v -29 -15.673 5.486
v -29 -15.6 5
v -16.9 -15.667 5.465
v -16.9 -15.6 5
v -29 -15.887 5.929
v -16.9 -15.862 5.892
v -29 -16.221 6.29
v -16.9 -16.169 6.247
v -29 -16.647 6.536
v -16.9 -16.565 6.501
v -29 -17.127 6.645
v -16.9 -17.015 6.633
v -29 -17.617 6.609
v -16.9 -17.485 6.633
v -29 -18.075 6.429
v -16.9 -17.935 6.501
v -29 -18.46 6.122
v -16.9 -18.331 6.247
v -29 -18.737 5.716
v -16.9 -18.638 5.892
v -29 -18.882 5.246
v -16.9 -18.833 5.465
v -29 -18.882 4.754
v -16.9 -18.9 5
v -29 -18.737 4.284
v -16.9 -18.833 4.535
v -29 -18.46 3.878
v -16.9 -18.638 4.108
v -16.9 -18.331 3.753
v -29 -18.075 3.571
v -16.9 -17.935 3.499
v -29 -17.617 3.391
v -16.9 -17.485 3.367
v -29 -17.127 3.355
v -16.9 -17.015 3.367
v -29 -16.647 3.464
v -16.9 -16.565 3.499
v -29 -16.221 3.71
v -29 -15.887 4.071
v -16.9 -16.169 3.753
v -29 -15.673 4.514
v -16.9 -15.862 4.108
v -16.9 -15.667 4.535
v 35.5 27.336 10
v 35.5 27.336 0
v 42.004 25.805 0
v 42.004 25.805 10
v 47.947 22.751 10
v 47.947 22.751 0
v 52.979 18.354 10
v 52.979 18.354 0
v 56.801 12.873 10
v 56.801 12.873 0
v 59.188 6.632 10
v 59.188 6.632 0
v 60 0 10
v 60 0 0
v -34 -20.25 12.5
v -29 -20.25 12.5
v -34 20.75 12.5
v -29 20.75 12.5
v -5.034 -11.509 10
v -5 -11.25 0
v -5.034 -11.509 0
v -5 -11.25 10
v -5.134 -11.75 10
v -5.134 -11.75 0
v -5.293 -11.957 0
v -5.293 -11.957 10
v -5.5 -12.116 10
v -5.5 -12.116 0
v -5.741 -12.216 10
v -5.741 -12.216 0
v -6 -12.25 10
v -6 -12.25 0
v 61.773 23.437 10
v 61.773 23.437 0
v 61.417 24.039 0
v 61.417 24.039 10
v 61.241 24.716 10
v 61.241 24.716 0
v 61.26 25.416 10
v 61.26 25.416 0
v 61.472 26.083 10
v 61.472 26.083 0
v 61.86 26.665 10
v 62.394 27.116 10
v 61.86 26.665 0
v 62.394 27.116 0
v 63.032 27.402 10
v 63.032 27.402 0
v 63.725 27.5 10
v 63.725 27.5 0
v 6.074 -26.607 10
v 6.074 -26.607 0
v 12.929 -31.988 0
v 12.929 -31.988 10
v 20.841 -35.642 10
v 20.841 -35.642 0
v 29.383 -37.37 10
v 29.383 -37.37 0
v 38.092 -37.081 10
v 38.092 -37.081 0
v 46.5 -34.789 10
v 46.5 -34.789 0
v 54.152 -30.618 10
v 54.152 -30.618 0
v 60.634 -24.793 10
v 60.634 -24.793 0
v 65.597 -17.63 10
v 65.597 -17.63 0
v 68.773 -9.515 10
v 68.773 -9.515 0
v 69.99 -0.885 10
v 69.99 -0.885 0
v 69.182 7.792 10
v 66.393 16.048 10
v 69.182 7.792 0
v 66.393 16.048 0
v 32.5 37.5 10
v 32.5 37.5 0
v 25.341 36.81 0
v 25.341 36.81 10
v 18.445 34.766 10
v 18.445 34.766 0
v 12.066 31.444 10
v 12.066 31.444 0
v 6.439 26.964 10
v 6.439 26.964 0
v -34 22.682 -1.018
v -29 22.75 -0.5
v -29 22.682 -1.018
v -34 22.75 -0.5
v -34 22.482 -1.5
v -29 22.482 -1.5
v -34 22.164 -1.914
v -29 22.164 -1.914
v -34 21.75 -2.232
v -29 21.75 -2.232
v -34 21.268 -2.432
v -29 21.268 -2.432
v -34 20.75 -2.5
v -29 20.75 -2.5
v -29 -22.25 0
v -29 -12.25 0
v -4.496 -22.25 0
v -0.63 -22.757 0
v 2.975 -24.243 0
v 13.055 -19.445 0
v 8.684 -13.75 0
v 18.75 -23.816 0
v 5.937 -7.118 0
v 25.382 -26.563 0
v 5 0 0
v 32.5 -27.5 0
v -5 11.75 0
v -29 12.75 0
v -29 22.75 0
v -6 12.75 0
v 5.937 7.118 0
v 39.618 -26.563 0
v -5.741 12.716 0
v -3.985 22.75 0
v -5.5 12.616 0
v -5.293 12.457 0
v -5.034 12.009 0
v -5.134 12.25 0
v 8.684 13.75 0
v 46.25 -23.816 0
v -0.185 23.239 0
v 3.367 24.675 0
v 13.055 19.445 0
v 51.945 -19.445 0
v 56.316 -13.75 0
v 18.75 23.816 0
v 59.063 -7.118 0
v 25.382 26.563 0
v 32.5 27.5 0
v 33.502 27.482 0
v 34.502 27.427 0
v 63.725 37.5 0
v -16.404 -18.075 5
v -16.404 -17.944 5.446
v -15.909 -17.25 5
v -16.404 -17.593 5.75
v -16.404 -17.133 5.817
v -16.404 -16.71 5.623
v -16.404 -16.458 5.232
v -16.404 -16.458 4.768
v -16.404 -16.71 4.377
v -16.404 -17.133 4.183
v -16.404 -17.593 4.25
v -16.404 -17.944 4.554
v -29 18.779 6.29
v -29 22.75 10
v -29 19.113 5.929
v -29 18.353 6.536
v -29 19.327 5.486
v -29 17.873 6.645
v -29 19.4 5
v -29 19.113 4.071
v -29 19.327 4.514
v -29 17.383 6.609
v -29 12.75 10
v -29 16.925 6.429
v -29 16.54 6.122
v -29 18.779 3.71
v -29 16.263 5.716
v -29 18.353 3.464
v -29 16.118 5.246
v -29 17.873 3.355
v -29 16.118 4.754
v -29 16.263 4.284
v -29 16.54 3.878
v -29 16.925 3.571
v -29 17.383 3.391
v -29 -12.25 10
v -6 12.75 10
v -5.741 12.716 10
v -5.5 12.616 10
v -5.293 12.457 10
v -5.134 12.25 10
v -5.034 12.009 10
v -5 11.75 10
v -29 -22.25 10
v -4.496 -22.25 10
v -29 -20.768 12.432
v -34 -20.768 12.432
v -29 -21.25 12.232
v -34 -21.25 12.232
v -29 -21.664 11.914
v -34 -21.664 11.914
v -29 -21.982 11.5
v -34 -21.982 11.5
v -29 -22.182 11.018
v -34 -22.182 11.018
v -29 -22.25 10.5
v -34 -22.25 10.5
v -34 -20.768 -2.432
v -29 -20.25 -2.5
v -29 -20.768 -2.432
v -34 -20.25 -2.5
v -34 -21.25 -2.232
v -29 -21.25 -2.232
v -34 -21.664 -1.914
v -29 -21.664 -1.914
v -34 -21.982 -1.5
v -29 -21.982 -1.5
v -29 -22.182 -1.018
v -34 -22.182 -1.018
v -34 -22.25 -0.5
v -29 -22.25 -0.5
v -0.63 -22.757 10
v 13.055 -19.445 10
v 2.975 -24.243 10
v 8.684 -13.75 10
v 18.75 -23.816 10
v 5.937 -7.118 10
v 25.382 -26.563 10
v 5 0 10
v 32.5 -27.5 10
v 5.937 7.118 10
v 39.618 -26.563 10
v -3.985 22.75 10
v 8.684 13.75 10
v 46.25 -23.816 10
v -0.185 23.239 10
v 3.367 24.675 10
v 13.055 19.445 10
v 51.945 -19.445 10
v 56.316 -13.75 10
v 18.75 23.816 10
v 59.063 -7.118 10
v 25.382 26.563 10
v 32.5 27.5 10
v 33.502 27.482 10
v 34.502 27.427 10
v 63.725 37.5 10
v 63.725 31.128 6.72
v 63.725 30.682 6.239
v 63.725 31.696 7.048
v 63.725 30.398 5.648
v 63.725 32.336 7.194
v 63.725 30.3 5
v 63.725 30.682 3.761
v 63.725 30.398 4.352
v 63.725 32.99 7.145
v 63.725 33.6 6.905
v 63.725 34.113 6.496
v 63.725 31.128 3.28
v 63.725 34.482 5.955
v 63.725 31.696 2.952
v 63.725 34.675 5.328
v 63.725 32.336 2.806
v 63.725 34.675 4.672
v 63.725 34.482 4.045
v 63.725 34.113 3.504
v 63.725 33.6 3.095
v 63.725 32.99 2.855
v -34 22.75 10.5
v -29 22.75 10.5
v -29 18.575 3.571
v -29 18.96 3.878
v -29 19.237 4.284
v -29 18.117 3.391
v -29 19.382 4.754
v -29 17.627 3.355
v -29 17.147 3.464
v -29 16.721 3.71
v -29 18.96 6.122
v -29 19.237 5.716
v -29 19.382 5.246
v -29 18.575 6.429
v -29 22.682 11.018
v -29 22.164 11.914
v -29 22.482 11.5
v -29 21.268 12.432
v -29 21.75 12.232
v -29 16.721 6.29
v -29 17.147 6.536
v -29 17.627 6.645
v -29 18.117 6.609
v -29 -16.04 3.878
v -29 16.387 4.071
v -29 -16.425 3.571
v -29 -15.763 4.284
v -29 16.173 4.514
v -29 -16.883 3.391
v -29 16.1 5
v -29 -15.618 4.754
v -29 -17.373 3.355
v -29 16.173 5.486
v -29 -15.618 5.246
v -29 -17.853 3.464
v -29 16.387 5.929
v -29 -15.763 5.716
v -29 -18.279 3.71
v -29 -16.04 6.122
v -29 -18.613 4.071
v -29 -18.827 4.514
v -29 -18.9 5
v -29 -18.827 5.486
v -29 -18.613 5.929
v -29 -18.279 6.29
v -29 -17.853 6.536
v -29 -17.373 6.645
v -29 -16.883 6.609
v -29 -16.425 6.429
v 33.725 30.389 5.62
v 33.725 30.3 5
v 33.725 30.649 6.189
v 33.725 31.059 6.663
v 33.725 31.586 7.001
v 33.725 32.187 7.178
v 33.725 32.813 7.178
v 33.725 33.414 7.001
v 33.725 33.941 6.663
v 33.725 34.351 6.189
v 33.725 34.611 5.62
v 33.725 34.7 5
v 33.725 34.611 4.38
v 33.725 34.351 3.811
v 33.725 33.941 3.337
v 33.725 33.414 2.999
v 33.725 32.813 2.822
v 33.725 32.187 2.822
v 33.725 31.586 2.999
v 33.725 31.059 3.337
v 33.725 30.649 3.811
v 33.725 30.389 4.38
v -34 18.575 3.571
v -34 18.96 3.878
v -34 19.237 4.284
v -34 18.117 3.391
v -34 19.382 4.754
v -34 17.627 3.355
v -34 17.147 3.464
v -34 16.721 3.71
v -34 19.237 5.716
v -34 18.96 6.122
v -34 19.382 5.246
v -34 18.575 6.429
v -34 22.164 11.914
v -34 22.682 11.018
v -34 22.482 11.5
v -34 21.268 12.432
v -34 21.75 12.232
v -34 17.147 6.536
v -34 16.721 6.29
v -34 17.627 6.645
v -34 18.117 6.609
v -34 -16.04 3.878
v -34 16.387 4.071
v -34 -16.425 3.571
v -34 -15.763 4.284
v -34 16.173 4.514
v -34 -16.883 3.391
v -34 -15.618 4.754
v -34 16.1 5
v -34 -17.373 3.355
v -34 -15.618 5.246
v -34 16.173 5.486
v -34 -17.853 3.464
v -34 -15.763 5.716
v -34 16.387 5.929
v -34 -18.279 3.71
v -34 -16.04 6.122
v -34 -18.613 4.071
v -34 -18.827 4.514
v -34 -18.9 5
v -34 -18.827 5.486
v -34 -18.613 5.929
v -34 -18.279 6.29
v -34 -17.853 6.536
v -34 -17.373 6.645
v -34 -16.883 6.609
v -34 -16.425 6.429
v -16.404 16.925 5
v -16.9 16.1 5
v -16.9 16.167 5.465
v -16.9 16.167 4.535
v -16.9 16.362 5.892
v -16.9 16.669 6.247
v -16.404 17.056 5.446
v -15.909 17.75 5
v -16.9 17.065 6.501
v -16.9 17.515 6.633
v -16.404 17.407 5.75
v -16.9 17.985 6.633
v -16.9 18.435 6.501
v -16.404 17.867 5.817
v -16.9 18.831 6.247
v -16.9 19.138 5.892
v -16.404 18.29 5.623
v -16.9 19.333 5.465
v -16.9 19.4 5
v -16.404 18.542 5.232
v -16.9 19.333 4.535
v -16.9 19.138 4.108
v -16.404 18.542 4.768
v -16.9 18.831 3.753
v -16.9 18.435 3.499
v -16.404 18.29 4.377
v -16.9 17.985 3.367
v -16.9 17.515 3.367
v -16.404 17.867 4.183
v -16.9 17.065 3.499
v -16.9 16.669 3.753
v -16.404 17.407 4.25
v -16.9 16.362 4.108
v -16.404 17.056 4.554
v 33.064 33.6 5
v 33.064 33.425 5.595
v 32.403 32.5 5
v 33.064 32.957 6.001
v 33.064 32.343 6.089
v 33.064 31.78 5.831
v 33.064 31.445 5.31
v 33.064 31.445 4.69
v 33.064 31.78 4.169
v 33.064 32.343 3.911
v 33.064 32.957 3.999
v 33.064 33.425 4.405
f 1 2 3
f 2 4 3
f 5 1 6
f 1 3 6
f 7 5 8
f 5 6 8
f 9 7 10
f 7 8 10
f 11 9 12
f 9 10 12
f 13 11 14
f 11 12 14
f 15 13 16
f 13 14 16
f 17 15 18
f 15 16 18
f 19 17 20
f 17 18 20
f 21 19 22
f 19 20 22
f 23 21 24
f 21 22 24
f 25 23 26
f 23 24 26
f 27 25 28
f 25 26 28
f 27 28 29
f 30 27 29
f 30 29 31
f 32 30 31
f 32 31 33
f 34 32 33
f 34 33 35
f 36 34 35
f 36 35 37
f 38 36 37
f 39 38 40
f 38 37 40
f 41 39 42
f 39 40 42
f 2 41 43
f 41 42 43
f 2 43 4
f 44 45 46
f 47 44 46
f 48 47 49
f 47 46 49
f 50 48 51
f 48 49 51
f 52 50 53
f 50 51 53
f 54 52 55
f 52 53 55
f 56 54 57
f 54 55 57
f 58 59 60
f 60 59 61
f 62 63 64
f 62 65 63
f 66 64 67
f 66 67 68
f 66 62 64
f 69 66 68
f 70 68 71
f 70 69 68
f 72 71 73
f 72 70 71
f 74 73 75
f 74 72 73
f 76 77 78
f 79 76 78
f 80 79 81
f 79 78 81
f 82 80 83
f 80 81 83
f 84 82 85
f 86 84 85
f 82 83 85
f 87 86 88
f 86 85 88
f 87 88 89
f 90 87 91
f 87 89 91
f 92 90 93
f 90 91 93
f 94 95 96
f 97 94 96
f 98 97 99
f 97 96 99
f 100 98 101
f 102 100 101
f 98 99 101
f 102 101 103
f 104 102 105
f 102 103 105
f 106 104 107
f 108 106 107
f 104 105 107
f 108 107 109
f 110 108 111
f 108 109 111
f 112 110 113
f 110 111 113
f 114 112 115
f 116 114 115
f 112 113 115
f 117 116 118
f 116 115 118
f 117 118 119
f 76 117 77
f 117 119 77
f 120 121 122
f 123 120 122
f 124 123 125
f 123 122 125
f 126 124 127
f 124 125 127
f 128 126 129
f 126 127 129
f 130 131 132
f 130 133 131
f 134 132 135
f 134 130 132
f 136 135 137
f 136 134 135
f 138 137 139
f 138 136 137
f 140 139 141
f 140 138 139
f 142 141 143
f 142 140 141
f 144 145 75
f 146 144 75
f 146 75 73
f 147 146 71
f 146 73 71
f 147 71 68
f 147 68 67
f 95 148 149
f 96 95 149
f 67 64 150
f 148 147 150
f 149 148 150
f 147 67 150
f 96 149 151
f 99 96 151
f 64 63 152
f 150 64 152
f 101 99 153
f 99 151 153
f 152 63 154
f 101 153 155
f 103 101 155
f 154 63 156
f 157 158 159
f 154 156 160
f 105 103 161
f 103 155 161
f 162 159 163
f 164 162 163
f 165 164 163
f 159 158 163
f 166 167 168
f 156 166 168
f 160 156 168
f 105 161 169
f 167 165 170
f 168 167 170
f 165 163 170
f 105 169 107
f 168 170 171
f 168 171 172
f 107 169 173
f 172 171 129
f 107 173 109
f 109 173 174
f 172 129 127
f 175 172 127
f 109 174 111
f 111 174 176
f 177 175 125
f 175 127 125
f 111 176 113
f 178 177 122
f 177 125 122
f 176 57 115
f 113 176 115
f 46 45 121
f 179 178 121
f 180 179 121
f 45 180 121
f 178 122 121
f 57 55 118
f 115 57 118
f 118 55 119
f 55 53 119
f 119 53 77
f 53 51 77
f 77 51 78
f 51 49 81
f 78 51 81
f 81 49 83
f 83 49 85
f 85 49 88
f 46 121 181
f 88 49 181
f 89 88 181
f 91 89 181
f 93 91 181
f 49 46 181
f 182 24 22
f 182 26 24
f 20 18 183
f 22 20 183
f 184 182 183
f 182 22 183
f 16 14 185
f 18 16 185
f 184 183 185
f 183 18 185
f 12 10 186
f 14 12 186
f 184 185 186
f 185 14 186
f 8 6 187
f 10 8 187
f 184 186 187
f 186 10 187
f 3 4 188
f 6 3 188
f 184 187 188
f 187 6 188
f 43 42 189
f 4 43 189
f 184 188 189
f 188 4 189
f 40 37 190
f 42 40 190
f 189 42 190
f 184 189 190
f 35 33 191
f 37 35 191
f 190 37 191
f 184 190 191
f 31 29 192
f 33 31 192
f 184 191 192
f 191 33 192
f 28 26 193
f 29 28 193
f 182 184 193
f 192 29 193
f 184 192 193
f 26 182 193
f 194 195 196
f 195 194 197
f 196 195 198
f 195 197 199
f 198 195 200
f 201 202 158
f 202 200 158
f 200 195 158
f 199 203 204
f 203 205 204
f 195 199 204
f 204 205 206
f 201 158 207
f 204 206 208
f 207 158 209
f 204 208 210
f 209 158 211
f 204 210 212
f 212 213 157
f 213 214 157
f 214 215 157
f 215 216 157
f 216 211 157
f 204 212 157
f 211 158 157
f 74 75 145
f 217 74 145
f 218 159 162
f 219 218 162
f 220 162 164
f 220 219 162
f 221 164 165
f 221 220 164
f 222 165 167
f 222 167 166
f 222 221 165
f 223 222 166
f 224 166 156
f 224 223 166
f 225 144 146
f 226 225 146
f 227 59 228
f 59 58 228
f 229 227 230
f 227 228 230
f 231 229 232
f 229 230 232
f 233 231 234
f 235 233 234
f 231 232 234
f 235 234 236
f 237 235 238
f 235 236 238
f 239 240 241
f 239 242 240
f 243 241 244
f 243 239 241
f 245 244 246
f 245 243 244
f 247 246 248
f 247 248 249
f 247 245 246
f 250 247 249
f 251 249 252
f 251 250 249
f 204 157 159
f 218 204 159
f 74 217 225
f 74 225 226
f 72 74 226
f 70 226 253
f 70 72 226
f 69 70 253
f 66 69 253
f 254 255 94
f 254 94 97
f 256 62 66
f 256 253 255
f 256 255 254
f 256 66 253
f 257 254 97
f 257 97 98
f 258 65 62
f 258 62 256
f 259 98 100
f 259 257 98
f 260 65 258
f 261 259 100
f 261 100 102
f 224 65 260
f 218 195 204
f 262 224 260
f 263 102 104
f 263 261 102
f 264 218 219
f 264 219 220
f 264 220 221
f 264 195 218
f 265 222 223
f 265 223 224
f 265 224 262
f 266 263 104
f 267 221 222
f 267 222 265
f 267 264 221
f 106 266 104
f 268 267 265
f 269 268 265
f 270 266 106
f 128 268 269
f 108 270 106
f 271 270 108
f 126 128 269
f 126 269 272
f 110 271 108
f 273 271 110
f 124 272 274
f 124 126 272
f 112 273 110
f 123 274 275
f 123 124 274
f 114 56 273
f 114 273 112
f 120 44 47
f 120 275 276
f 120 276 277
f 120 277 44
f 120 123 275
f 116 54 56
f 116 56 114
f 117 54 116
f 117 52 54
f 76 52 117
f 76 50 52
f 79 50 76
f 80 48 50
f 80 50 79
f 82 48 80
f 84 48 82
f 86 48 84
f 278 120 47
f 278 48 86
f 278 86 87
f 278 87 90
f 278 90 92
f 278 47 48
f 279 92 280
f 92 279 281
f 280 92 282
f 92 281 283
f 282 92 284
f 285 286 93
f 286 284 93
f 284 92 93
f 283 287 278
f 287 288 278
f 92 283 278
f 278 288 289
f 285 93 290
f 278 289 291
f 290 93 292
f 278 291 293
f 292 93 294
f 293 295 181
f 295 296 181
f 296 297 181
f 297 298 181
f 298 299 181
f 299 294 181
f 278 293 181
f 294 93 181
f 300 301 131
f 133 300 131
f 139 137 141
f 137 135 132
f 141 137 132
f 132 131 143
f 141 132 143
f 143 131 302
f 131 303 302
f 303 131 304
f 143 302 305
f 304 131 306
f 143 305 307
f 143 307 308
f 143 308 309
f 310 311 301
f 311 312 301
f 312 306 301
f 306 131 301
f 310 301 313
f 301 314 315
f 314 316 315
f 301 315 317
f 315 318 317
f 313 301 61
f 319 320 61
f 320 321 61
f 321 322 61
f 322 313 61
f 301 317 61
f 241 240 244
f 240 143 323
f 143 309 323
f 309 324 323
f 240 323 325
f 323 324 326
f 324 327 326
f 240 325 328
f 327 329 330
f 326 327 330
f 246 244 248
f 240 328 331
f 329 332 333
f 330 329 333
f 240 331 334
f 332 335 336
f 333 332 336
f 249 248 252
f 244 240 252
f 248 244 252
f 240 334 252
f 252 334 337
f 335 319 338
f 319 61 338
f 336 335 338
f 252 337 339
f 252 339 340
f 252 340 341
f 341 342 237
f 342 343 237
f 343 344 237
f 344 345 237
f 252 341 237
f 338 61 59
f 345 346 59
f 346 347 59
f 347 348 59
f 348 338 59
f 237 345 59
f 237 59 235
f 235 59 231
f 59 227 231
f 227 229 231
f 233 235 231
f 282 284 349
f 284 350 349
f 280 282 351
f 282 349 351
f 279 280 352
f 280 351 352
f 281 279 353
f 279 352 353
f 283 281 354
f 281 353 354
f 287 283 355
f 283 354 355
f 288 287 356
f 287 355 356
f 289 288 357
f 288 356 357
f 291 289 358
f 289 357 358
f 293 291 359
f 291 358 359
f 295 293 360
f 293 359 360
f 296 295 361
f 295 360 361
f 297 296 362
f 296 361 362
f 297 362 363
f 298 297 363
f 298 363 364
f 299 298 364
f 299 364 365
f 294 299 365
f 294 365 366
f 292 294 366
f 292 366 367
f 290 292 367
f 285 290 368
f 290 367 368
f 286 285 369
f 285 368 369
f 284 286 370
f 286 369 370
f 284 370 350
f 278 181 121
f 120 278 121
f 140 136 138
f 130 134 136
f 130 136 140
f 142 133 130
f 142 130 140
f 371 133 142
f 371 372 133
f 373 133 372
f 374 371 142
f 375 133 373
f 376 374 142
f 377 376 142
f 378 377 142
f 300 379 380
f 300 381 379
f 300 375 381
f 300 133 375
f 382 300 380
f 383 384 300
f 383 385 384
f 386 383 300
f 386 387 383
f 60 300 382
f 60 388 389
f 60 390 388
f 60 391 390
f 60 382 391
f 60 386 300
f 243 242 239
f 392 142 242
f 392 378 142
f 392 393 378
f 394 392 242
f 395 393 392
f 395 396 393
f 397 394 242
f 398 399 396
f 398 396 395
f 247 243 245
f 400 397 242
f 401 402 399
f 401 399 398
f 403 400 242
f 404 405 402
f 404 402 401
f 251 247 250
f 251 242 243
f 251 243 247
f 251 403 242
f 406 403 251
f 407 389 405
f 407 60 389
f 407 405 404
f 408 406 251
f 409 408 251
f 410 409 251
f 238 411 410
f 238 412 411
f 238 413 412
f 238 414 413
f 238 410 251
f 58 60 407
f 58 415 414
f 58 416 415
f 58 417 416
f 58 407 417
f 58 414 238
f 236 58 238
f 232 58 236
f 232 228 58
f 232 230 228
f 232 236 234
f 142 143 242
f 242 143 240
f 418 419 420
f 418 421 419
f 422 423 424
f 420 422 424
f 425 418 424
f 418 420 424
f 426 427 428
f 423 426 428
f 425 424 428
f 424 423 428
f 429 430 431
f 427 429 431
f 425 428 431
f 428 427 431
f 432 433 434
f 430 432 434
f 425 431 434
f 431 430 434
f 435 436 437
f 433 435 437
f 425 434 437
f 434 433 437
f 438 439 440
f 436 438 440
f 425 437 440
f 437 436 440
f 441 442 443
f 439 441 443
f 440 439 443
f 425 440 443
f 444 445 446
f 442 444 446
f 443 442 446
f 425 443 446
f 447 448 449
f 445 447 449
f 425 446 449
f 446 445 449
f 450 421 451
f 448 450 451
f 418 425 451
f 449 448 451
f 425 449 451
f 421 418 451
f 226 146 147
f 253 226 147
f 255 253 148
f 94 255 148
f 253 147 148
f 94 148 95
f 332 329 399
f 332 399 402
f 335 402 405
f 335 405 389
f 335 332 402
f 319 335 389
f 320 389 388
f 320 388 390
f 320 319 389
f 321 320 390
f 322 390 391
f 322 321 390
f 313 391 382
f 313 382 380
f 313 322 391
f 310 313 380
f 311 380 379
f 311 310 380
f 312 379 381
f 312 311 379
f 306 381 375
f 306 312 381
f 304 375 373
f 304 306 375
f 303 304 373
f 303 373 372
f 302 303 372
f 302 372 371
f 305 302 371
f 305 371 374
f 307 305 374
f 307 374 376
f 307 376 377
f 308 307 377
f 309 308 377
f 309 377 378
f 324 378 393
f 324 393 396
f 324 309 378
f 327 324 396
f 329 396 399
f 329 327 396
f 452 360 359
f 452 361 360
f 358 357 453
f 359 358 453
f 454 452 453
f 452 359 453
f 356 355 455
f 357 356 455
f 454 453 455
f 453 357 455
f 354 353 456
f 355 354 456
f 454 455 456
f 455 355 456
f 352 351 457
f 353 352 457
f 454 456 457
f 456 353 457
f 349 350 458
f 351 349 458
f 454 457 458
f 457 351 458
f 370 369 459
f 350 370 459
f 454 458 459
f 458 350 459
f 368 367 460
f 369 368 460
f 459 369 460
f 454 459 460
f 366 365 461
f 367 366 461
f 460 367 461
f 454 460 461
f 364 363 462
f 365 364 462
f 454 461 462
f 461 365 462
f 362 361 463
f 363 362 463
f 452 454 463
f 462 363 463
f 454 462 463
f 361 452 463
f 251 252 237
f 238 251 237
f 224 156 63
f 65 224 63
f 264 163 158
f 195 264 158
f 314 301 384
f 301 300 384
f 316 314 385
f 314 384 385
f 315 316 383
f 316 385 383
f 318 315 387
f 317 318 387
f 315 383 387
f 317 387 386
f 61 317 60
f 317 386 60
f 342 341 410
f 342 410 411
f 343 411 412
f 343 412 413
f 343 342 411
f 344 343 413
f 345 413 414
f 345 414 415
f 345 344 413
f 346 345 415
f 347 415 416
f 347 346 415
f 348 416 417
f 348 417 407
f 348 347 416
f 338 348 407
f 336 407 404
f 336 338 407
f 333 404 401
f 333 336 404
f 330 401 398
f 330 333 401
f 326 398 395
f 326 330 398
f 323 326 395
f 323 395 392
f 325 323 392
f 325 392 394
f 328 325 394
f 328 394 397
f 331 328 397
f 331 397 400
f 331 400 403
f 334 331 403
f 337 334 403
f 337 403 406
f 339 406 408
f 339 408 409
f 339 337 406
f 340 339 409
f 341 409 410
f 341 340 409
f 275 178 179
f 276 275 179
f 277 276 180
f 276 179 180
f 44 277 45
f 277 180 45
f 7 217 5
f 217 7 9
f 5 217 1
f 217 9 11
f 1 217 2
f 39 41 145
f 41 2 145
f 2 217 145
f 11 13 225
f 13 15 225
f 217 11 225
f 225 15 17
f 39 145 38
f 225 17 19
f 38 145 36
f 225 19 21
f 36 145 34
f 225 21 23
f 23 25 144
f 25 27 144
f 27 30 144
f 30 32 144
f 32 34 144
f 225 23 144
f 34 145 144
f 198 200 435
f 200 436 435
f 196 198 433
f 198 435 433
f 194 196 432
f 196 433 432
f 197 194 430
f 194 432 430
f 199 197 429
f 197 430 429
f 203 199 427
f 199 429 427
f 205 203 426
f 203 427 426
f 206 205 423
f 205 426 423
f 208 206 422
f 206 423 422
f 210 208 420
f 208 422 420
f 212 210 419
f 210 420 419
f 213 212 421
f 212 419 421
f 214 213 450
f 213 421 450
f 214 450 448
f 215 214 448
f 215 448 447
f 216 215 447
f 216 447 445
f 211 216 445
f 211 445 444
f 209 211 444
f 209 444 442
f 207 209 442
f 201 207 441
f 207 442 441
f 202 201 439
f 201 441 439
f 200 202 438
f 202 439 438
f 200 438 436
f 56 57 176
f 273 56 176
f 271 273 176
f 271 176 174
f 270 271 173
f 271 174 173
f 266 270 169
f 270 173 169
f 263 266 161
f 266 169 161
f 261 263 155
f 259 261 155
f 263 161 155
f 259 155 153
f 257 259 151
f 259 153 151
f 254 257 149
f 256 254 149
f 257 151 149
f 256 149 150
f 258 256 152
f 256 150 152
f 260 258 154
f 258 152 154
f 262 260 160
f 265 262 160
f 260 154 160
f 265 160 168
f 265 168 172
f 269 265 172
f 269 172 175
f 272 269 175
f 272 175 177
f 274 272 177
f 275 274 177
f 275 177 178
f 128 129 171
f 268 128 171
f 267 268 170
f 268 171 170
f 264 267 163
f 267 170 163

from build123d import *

# Parameters (mm, degrees)
F1_DEPTH       = 10
F5_D           = 3.3
F5_DEPTH       = 12.1
F5_TIP         = 0.9914200214
F5_ON_F4_D     = 3.3
F5_ON_F4_DEPTH = 12.1
F5_ON_F4_TIP   = 0.9914200214
F6_D           = 4.4
F6_DEPTH       = 30
F6_TIP         = 1.3218933619
F7_R           = 1.65
F7_W           = 10
F7_H           = 10
F8_DEPTH       = 5
F9_R           = 2
F10_R          = 1


with BuildPart() as f1:
    # F0 (on Top) → F1 (new body)
    with BuildSketch(Plane.XY):
        with BuildLine():
            Line((-29, 12.75), (-5, 12.75))
            Line((-5, 12.75), (-5, -12.25))
            Line((-5, -12.25), (-29, -12.25))
            Line((-29, -12.25), (-29, -22.25))
            Line((-29, -22.25), (-4.495776786, -22.25))
            ThreePointArc((-4.495776786, -22.25), (1.2207406353, -23.3819998352), (6.0744451529, -26.6071428571))
            ThreePointArc((6.0744451529, -26.6071428571), (57.5628044164, -27.8945484779), (61.7734281175, 23.4375))
            ThreePointArc((61.7734281175, 23.4375), (61.4715204448, 26.0825317547), (63.724989992, 27.5))
            Line((63.724989992, 27.5), (63.724989992, 37.5))
            Line((63.724989992, 37.5), (32.5, 37.5))
            ThreePointArc((32.5, 37.5), (18.4449424456, 34.7664400988), (6.438969784, 26.9642857143))
            ThreePointArc((6.438969784, 26.9642857143), (1.6365807194, 23.8434239605), (-3.9854423024, 22.75))
            Line((-3.9854423024, 22.75), (-29, 22.75))
            Line((-29, 22.75), (-29, 12.75))
        make_face()
        with BuildLine():
            ThreePointArc((60, 0), (13.0545635174, -19.4454364826), (32.5, 27.5))
            ThreePointArc((32.5, 27.5), (34.0022431052, 27.45893781), (35.5, 27.3358738657))
            ThreePointArc((35.5, 27.3358738657), (52.9786474163, 18.354154843), (60, 0))
        make_face(mode=Mode.SUBTRACT)
    extrude(amount=F1_DEPTH)

    # F5
    with Locations(Plane(origin=(-29, 0, 0), x_dir=(0, -1, 0), z_dir=(-1, 0, 0))):
        with Locations((-17.75, 5)):
            Hole(F5_D / 2, depth=F5_DEPTH)
            with Locations((0, 0, -(F5_DEPTH + F5_TIP / 2))):  # 118° drill point
                Cone(0, F5_D / 2, F5_TIP, mode=Mode.SUBTRACT)

    # F5 on F4
    with Locations(Plane(origin=(-29, 0, 0), x_dir=(0, -1, 0), z_dir=(-1, 0, 0))):
        with Locations((17.25, 5)):
            Hole(F5_ON_F4_D / 2, depth=F5_ON_F4_DEPTH)
            with Locations((0, 0, -(F5_ON_F4_DEPTH + F5_ON_F4_TIP / 2))):  # 118° drill point
                Cone(0, F5_ON_F4_D / 2, F5_ON_F4_TIP, mode=Mode.SUBTRACT)

    # F6
    with Locations(Plane.YZ.offset(63.724989992)):
        with Locations((32.5, 5)):
            Hole(F6_D / 2, depth=F6_DEPTH)
            with Locations((0, 0, -(F6_DEPTH + F6_TIP / 2))):  # 118° drill point
                Cone(0, F6_D / 2, F6_TIP, mode=Mode.SUBTRACT)

    # F10
    f10_edges = [f1.edges().sort_by_distance(p)[0] for p in [
        (-5, 12.75, 5),
        (-5, -12.25, 5),
    ]]
    fillet(f10_edges, radius=F10_R)


with BuildPart() as f8:
    # F7 (on face) → F8 (new body)
    with BuildSketch(Plane(origin=(-29, 0, 0), x_dir=(0, -1, 0), z_dir=(-1, 0, 0))):
        Polygon((-22.75, 12.5), (-22.75, -2.5), (22.25, -2.5), (22.25, 0), (12.25, 0), (12.25, 10), (22.25, 10), (22.25, 12.5), align=None)
        with Locations((-17.75, 5)):
            Circle(F7_R, mode=Mode.SUBTRACT)
        with Locations((17.25, 5)):
            Rectangle(F7_W, F7_H)
        with Locations((17.25, 5)):
            Circle(F7_R, mode=Mode.SUBTRACT)
    extrude(amount=F8_DEPTH)

    # F9
    f9_edges = [f8.edges().sort_by_distance(p)[0] for p in [
        (-31.5, 22.75, 12.5),
        (-31.5, -22.25, 12.5),
        (-31.5, -22.25, -2.5),
        (-31.5, 22.75, -2.5),
    ]]
    fillet(f9_edges, radius=F9_R)


solid = Compound([f1.part, f8.part])
